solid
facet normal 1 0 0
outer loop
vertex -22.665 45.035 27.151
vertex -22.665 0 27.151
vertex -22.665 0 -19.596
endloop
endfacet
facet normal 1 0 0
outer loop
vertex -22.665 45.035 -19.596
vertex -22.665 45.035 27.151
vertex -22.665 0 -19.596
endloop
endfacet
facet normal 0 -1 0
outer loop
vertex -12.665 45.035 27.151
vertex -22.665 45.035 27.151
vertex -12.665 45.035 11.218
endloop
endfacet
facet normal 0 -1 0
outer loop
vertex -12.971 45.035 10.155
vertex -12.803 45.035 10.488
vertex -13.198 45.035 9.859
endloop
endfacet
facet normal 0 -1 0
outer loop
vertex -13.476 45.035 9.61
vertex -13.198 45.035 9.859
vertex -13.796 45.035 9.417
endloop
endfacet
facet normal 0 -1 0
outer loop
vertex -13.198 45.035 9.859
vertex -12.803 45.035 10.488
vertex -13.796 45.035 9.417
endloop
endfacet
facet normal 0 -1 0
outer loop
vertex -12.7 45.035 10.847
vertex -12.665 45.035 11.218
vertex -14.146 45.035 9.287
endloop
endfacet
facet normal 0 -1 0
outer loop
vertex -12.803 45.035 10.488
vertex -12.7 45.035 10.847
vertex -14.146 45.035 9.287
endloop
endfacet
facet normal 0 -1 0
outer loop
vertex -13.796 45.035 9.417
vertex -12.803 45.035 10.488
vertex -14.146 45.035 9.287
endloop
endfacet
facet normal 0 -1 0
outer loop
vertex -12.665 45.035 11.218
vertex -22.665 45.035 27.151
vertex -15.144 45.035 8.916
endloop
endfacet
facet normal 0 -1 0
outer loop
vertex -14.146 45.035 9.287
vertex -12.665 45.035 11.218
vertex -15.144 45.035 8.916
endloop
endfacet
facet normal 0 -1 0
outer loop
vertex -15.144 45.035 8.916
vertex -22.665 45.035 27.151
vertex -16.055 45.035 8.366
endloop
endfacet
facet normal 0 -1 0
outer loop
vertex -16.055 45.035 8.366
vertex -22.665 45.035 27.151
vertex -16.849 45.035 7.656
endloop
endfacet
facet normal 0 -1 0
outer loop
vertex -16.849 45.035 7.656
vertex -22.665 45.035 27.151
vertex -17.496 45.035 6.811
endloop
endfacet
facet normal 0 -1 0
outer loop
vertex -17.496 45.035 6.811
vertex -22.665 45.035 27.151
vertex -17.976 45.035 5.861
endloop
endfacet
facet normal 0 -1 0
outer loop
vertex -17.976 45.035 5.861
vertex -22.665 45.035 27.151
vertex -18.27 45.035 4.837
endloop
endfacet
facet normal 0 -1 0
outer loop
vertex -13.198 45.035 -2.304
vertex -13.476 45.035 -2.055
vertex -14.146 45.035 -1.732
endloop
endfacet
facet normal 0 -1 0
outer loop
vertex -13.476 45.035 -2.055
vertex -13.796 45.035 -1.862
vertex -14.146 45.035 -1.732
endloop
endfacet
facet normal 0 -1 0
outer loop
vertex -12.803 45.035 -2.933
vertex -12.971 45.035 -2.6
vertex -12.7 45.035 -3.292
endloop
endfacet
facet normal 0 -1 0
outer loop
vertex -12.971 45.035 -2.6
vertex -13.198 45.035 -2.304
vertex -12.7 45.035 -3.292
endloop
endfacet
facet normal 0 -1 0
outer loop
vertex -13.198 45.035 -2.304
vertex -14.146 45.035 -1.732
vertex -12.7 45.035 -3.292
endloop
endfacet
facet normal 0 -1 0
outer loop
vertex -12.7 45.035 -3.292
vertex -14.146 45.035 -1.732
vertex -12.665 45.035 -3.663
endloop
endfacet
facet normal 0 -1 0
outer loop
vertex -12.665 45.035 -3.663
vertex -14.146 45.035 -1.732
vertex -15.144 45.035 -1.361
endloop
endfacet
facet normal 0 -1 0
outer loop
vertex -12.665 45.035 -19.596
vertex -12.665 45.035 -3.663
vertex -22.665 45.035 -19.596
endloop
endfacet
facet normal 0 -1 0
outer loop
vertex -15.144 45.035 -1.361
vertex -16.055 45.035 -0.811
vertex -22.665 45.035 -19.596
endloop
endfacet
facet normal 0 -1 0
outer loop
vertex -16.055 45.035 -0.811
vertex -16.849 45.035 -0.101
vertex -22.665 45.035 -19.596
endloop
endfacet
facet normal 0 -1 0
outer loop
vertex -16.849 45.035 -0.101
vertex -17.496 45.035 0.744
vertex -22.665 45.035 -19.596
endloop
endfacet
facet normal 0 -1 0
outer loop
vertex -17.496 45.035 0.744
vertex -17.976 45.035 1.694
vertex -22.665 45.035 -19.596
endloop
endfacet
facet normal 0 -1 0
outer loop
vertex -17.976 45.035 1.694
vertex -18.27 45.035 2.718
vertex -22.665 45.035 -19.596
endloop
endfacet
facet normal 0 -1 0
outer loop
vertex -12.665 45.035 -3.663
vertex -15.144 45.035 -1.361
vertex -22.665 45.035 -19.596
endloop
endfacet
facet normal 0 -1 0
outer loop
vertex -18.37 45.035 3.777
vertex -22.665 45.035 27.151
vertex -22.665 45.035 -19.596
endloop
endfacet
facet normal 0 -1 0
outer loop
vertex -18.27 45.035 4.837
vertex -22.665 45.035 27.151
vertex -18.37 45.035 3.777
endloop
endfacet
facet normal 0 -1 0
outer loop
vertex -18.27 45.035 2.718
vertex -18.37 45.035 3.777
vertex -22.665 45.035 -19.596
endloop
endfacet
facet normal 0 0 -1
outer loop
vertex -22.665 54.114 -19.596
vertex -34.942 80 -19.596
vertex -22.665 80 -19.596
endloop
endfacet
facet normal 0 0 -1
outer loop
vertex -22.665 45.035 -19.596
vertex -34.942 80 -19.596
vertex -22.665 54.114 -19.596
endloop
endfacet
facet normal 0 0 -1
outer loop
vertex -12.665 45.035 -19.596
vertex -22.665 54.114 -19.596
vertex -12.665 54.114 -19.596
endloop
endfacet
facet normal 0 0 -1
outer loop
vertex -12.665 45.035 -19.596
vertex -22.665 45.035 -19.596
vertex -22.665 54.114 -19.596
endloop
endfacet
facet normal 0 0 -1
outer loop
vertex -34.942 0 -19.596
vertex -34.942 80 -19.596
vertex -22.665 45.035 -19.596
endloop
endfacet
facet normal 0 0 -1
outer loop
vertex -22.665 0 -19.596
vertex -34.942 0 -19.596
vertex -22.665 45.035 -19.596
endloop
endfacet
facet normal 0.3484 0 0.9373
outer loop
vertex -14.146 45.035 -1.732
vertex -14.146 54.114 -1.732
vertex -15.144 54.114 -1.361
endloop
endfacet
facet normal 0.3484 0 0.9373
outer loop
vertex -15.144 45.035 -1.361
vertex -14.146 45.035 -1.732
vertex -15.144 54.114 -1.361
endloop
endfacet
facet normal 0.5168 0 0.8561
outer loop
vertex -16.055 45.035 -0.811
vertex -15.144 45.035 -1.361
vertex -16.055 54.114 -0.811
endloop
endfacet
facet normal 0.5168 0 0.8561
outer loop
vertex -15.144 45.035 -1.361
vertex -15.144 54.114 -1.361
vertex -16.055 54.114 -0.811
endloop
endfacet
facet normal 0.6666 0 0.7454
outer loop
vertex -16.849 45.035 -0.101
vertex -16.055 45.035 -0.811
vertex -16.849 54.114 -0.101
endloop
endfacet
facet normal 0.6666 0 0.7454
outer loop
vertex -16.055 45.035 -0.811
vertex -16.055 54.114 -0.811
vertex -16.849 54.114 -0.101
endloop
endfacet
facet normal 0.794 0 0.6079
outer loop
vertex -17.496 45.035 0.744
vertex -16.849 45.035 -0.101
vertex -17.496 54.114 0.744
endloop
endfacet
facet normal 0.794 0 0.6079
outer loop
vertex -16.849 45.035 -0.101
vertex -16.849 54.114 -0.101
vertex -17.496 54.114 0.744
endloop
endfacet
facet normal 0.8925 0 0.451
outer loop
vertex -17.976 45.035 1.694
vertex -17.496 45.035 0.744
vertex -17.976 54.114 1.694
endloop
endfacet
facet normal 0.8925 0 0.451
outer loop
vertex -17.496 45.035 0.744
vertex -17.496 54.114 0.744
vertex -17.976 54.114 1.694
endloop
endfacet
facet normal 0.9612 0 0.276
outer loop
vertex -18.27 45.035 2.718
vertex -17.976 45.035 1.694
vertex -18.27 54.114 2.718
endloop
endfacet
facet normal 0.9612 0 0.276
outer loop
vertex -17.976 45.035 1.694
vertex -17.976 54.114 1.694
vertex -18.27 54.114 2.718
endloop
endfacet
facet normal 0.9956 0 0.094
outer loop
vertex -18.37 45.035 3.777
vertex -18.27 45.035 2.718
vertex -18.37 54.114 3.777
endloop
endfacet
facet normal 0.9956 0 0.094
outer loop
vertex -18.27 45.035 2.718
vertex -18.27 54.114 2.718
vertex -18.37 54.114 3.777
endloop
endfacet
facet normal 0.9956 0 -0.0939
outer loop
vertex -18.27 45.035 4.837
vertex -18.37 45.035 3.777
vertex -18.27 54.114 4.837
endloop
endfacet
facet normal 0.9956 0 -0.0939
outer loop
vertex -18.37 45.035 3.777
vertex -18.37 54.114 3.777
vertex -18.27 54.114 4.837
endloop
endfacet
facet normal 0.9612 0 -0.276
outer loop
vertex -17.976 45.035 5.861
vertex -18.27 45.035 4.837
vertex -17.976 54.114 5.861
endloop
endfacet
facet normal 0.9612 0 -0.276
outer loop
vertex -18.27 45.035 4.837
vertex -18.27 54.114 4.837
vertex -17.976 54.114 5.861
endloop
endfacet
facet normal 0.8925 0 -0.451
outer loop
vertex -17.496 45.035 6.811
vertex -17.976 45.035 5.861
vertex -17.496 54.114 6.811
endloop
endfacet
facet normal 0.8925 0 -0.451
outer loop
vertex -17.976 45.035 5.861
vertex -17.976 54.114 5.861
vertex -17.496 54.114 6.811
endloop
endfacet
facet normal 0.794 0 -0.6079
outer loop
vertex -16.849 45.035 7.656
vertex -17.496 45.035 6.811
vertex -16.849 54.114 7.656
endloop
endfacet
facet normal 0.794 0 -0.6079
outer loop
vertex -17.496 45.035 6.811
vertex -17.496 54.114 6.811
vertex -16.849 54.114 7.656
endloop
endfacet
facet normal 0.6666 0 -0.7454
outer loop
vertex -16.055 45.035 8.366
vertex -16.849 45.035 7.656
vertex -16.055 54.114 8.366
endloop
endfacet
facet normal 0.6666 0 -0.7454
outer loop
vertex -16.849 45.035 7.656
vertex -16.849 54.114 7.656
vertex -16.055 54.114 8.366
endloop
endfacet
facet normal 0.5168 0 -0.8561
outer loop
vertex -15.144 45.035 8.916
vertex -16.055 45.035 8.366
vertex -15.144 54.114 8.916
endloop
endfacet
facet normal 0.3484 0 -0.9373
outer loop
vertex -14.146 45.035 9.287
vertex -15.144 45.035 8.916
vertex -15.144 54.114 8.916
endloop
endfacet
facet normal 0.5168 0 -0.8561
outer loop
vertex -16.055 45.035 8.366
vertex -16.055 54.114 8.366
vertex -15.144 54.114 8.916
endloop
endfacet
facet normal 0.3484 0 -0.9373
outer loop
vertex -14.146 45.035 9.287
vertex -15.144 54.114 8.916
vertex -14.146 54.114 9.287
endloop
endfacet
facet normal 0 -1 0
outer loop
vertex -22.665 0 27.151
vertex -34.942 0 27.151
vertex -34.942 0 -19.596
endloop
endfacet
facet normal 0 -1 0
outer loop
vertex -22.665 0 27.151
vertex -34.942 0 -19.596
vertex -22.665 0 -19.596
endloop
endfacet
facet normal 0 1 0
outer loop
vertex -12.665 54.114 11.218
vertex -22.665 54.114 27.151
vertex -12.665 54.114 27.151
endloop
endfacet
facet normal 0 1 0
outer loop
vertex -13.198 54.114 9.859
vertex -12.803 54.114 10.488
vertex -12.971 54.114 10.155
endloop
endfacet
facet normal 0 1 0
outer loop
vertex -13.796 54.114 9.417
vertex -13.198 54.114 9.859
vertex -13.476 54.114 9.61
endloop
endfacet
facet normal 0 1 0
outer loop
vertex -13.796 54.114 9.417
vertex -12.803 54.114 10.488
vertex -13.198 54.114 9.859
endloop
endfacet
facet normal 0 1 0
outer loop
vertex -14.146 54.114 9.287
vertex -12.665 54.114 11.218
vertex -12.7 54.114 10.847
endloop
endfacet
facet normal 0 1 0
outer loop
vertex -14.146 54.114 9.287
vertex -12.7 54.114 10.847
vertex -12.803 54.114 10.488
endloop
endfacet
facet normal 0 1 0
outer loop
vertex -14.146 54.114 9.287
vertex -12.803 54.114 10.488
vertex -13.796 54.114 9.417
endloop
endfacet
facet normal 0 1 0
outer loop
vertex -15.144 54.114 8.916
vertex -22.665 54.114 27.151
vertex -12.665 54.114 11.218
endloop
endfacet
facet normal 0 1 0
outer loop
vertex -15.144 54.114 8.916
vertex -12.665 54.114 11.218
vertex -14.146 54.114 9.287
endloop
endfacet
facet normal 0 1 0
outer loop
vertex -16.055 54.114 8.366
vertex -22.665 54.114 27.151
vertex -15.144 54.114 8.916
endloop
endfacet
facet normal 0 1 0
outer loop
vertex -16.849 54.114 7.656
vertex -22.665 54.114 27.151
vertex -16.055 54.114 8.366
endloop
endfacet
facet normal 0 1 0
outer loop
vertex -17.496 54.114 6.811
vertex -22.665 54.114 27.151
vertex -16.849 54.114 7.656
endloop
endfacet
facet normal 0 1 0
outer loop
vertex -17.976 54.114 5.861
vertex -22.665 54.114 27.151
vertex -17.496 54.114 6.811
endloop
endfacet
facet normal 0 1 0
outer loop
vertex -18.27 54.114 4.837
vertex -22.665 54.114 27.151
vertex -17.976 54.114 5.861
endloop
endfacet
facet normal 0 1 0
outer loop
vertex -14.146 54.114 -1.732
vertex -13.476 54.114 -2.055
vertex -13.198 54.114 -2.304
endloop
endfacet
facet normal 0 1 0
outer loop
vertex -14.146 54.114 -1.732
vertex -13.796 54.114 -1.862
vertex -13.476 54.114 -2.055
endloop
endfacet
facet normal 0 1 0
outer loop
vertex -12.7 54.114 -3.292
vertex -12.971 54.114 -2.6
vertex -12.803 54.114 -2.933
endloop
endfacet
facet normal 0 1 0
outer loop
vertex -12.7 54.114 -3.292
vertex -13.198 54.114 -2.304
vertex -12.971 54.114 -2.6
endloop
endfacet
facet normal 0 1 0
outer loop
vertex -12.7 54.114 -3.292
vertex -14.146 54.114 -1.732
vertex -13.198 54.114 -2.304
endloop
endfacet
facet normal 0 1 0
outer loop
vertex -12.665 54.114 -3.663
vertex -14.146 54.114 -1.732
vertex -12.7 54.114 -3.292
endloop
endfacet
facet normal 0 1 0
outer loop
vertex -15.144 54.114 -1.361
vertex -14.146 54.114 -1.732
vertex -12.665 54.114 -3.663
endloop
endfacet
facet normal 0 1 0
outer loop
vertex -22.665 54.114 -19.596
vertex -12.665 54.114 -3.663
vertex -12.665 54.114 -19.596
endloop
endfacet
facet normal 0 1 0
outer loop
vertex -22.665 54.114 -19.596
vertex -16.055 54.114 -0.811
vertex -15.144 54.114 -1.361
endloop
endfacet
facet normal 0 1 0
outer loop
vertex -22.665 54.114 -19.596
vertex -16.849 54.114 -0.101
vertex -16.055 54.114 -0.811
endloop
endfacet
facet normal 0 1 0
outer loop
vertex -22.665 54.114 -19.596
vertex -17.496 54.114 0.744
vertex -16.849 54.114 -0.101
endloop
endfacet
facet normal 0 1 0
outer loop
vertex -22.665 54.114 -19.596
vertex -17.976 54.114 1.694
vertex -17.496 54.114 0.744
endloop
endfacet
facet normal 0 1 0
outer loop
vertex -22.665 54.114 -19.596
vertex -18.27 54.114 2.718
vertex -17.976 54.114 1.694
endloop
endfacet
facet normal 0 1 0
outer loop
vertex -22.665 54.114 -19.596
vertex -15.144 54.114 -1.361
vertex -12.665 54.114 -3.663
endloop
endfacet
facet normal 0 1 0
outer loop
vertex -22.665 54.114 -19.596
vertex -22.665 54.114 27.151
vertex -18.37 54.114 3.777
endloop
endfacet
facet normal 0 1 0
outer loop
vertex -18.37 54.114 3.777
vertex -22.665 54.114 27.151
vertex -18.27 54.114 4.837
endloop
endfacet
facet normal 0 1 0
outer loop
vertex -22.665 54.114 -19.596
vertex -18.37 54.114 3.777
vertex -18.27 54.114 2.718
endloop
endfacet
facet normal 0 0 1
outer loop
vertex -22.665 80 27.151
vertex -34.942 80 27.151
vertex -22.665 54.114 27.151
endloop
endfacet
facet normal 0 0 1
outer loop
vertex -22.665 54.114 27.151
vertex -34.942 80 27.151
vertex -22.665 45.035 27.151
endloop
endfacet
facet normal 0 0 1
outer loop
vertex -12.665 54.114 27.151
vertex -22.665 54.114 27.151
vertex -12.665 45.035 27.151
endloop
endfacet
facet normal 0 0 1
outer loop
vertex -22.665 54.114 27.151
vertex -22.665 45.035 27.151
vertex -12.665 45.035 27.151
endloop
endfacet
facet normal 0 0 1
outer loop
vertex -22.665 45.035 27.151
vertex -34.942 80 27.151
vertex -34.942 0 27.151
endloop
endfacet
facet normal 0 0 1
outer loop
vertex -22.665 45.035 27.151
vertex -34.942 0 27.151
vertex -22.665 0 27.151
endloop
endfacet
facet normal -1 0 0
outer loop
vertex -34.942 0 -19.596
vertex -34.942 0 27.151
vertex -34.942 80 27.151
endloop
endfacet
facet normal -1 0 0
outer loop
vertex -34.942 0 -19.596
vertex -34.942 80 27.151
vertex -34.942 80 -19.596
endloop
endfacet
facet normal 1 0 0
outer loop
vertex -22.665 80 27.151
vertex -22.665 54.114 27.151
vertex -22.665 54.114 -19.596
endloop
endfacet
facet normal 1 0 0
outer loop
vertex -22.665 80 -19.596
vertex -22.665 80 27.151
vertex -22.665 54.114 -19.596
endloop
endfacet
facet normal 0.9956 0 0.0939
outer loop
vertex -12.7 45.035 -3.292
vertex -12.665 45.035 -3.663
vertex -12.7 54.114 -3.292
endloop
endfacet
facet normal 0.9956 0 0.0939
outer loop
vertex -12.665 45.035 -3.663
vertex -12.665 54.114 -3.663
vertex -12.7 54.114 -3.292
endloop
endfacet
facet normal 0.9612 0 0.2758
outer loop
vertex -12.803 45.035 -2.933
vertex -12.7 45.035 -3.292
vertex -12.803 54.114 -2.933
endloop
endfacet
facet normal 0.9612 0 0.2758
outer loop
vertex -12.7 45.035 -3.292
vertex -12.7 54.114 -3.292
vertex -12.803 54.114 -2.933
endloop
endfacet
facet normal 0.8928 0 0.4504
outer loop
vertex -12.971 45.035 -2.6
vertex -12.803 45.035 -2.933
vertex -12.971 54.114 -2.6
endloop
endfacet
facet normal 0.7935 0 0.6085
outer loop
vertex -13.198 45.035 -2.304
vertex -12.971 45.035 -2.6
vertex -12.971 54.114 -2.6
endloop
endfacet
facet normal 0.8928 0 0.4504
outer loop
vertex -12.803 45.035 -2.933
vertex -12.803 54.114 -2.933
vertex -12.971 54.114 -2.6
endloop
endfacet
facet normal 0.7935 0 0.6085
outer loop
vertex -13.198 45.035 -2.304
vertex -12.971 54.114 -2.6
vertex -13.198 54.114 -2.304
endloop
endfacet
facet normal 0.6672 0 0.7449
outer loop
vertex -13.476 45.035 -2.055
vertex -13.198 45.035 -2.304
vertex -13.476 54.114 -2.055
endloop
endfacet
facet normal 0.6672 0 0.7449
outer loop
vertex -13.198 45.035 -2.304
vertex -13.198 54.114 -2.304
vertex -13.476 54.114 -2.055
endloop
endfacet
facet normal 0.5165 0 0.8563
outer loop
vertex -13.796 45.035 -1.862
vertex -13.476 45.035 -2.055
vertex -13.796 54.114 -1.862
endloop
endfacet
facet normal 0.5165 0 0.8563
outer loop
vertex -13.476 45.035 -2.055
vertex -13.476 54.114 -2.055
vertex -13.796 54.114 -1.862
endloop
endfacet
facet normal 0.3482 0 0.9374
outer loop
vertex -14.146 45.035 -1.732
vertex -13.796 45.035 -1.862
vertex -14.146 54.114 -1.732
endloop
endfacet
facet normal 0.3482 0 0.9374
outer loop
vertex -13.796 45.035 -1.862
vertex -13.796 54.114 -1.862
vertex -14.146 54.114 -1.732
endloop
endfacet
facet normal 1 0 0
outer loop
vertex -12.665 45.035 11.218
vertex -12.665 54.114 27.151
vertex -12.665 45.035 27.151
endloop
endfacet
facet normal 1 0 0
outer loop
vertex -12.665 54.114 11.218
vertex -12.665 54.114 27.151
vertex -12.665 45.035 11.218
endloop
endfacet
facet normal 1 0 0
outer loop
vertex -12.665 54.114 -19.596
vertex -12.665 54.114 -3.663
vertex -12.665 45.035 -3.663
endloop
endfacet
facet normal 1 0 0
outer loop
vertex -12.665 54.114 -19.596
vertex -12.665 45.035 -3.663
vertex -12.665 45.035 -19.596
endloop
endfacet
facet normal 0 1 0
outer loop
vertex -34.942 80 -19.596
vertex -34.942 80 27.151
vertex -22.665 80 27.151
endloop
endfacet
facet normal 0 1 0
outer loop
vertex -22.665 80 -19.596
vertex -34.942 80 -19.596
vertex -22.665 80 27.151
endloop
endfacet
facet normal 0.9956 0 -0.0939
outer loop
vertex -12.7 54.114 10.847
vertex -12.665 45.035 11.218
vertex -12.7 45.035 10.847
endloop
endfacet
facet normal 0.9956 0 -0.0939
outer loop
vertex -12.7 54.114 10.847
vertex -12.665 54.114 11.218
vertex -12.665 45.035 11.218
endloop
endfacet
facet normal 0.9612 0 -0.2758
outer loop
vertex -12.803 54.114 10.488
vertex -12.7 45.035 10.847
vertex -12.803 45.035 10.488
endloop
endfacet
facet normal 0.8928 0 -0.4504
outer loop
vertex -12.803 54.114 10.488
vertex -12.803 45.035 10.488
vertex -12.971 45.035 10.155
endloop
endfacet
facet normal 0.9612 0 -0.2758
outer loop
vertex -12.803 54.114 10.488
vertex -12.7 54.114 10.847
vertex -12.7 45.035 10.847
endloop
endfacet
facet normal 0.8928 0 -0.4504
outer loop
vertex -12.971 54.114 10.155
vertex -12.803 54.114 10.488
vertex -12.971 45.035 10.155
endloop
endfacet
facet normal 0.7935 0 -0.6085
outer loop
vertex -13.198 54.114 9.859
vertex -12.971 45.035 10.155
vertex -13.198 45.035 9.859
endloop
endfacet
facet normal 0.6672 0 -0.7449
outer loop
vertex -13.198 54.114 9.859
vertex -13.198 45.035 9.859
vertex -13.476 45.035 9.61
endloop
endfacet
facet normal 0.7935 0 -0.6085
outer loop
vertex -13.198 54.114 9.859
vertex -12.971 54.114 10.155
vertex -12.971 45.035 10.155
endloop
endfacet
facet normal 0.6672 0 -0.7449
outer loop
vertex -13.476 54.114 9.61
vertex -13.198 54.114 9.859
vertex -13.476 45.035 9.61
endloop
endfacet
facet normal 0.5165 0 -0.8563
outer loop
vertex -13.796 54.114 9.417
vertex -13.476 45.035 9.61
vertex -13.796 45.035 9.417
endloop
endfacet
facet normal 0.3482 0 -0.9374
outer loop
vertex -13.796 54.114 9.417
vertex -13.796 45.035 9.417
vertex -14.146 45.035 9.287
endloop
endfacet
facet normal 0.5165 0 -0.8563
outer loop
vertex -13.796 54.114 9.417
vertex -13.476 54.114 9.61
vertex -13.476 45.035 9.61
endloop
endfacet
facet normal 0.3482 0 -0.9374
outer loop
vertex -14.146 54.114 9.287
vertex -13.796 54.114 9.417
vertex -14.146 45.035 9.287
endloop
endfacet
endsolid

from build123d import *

# Parameters (mm, degrees)
SKETCH1_W           = 12.276797887
SKETCH1_H           = 46.74626888
BOSS_EXTRUDE1_DEPTH = 80
SKETCH8_W           = 46.74626888
SKETCH8_H           = 9.079638953
BOSS_EXTRUDE2_DEPTH = 10
CUT_EXTRUDE1_REACH  = 71.903
SKETCH10_R          = 5.704864585
FILLET1_R           = 2


with BuildPart() as part:
    # Sketch1 → Boss-Extrude1 (new body)
    with BuildSketch(Plane(origin=(0, 0, 0), x_dir=(1, 0, 0), z_dir=(0, 1, 0))):
        with Locations((-28.803256583, -3.777476273)):
            Rectangle(SKETCH1_W, SKETCH1_H)
    extrude(amount=BOSS_EXTRUDE1_DEPTH)

    # Sketch8 → Boss-Extrude2 (add)
    with BuildSketch(Plane(origin=(-22.664857639, 0, 0), x_dir=(0, 0, -1), z_dir=(1, 0, 0))):
        with Locations((-3.777476273, 49.574364566)):
            Rectangle(SKETCH8_W, SKETCH8_H)
    extrude(amount=BOSS_EXTRUDE2_DEPTH)

    # Sketch10 → Cut-Extrude1 (cut, up to next)
    with BuildSketch(Plane(origin=(0, 54.114184042, 0), x_dir=(1, 0, 0), z_dir=(0, 1, 0)), mode=Mode.PRIVATE) as cut_extrude1_sk1:
        with Locations((-12.664857639, -3.777476273)):
            Circle(SKETCH10_R)
    cut_extrude1_tool1 = extrude(cut_extrude1_sk1.sketch, amount=-CUT_EXTRUDE1_REACH, mode=Mode.PRIVATE) & part.part
    add(cut_extrude1_tool1.solids().sort_by_distance((-12.664858, 54.114184, 3.777476))[0], mode=Mode.SUBTRACT)

    # Fillet1
    fillet1_edges = [part.edges().sort_by_distance(p)[0] for p in [
        (-12.664857639, 49.574364566, -1.927388312),
        (-12.664857639, 49.574364566, 9.482340858),
    ]]
    fillet(fillet1_edges, radius=FILLET1_R)


solid = part.part
